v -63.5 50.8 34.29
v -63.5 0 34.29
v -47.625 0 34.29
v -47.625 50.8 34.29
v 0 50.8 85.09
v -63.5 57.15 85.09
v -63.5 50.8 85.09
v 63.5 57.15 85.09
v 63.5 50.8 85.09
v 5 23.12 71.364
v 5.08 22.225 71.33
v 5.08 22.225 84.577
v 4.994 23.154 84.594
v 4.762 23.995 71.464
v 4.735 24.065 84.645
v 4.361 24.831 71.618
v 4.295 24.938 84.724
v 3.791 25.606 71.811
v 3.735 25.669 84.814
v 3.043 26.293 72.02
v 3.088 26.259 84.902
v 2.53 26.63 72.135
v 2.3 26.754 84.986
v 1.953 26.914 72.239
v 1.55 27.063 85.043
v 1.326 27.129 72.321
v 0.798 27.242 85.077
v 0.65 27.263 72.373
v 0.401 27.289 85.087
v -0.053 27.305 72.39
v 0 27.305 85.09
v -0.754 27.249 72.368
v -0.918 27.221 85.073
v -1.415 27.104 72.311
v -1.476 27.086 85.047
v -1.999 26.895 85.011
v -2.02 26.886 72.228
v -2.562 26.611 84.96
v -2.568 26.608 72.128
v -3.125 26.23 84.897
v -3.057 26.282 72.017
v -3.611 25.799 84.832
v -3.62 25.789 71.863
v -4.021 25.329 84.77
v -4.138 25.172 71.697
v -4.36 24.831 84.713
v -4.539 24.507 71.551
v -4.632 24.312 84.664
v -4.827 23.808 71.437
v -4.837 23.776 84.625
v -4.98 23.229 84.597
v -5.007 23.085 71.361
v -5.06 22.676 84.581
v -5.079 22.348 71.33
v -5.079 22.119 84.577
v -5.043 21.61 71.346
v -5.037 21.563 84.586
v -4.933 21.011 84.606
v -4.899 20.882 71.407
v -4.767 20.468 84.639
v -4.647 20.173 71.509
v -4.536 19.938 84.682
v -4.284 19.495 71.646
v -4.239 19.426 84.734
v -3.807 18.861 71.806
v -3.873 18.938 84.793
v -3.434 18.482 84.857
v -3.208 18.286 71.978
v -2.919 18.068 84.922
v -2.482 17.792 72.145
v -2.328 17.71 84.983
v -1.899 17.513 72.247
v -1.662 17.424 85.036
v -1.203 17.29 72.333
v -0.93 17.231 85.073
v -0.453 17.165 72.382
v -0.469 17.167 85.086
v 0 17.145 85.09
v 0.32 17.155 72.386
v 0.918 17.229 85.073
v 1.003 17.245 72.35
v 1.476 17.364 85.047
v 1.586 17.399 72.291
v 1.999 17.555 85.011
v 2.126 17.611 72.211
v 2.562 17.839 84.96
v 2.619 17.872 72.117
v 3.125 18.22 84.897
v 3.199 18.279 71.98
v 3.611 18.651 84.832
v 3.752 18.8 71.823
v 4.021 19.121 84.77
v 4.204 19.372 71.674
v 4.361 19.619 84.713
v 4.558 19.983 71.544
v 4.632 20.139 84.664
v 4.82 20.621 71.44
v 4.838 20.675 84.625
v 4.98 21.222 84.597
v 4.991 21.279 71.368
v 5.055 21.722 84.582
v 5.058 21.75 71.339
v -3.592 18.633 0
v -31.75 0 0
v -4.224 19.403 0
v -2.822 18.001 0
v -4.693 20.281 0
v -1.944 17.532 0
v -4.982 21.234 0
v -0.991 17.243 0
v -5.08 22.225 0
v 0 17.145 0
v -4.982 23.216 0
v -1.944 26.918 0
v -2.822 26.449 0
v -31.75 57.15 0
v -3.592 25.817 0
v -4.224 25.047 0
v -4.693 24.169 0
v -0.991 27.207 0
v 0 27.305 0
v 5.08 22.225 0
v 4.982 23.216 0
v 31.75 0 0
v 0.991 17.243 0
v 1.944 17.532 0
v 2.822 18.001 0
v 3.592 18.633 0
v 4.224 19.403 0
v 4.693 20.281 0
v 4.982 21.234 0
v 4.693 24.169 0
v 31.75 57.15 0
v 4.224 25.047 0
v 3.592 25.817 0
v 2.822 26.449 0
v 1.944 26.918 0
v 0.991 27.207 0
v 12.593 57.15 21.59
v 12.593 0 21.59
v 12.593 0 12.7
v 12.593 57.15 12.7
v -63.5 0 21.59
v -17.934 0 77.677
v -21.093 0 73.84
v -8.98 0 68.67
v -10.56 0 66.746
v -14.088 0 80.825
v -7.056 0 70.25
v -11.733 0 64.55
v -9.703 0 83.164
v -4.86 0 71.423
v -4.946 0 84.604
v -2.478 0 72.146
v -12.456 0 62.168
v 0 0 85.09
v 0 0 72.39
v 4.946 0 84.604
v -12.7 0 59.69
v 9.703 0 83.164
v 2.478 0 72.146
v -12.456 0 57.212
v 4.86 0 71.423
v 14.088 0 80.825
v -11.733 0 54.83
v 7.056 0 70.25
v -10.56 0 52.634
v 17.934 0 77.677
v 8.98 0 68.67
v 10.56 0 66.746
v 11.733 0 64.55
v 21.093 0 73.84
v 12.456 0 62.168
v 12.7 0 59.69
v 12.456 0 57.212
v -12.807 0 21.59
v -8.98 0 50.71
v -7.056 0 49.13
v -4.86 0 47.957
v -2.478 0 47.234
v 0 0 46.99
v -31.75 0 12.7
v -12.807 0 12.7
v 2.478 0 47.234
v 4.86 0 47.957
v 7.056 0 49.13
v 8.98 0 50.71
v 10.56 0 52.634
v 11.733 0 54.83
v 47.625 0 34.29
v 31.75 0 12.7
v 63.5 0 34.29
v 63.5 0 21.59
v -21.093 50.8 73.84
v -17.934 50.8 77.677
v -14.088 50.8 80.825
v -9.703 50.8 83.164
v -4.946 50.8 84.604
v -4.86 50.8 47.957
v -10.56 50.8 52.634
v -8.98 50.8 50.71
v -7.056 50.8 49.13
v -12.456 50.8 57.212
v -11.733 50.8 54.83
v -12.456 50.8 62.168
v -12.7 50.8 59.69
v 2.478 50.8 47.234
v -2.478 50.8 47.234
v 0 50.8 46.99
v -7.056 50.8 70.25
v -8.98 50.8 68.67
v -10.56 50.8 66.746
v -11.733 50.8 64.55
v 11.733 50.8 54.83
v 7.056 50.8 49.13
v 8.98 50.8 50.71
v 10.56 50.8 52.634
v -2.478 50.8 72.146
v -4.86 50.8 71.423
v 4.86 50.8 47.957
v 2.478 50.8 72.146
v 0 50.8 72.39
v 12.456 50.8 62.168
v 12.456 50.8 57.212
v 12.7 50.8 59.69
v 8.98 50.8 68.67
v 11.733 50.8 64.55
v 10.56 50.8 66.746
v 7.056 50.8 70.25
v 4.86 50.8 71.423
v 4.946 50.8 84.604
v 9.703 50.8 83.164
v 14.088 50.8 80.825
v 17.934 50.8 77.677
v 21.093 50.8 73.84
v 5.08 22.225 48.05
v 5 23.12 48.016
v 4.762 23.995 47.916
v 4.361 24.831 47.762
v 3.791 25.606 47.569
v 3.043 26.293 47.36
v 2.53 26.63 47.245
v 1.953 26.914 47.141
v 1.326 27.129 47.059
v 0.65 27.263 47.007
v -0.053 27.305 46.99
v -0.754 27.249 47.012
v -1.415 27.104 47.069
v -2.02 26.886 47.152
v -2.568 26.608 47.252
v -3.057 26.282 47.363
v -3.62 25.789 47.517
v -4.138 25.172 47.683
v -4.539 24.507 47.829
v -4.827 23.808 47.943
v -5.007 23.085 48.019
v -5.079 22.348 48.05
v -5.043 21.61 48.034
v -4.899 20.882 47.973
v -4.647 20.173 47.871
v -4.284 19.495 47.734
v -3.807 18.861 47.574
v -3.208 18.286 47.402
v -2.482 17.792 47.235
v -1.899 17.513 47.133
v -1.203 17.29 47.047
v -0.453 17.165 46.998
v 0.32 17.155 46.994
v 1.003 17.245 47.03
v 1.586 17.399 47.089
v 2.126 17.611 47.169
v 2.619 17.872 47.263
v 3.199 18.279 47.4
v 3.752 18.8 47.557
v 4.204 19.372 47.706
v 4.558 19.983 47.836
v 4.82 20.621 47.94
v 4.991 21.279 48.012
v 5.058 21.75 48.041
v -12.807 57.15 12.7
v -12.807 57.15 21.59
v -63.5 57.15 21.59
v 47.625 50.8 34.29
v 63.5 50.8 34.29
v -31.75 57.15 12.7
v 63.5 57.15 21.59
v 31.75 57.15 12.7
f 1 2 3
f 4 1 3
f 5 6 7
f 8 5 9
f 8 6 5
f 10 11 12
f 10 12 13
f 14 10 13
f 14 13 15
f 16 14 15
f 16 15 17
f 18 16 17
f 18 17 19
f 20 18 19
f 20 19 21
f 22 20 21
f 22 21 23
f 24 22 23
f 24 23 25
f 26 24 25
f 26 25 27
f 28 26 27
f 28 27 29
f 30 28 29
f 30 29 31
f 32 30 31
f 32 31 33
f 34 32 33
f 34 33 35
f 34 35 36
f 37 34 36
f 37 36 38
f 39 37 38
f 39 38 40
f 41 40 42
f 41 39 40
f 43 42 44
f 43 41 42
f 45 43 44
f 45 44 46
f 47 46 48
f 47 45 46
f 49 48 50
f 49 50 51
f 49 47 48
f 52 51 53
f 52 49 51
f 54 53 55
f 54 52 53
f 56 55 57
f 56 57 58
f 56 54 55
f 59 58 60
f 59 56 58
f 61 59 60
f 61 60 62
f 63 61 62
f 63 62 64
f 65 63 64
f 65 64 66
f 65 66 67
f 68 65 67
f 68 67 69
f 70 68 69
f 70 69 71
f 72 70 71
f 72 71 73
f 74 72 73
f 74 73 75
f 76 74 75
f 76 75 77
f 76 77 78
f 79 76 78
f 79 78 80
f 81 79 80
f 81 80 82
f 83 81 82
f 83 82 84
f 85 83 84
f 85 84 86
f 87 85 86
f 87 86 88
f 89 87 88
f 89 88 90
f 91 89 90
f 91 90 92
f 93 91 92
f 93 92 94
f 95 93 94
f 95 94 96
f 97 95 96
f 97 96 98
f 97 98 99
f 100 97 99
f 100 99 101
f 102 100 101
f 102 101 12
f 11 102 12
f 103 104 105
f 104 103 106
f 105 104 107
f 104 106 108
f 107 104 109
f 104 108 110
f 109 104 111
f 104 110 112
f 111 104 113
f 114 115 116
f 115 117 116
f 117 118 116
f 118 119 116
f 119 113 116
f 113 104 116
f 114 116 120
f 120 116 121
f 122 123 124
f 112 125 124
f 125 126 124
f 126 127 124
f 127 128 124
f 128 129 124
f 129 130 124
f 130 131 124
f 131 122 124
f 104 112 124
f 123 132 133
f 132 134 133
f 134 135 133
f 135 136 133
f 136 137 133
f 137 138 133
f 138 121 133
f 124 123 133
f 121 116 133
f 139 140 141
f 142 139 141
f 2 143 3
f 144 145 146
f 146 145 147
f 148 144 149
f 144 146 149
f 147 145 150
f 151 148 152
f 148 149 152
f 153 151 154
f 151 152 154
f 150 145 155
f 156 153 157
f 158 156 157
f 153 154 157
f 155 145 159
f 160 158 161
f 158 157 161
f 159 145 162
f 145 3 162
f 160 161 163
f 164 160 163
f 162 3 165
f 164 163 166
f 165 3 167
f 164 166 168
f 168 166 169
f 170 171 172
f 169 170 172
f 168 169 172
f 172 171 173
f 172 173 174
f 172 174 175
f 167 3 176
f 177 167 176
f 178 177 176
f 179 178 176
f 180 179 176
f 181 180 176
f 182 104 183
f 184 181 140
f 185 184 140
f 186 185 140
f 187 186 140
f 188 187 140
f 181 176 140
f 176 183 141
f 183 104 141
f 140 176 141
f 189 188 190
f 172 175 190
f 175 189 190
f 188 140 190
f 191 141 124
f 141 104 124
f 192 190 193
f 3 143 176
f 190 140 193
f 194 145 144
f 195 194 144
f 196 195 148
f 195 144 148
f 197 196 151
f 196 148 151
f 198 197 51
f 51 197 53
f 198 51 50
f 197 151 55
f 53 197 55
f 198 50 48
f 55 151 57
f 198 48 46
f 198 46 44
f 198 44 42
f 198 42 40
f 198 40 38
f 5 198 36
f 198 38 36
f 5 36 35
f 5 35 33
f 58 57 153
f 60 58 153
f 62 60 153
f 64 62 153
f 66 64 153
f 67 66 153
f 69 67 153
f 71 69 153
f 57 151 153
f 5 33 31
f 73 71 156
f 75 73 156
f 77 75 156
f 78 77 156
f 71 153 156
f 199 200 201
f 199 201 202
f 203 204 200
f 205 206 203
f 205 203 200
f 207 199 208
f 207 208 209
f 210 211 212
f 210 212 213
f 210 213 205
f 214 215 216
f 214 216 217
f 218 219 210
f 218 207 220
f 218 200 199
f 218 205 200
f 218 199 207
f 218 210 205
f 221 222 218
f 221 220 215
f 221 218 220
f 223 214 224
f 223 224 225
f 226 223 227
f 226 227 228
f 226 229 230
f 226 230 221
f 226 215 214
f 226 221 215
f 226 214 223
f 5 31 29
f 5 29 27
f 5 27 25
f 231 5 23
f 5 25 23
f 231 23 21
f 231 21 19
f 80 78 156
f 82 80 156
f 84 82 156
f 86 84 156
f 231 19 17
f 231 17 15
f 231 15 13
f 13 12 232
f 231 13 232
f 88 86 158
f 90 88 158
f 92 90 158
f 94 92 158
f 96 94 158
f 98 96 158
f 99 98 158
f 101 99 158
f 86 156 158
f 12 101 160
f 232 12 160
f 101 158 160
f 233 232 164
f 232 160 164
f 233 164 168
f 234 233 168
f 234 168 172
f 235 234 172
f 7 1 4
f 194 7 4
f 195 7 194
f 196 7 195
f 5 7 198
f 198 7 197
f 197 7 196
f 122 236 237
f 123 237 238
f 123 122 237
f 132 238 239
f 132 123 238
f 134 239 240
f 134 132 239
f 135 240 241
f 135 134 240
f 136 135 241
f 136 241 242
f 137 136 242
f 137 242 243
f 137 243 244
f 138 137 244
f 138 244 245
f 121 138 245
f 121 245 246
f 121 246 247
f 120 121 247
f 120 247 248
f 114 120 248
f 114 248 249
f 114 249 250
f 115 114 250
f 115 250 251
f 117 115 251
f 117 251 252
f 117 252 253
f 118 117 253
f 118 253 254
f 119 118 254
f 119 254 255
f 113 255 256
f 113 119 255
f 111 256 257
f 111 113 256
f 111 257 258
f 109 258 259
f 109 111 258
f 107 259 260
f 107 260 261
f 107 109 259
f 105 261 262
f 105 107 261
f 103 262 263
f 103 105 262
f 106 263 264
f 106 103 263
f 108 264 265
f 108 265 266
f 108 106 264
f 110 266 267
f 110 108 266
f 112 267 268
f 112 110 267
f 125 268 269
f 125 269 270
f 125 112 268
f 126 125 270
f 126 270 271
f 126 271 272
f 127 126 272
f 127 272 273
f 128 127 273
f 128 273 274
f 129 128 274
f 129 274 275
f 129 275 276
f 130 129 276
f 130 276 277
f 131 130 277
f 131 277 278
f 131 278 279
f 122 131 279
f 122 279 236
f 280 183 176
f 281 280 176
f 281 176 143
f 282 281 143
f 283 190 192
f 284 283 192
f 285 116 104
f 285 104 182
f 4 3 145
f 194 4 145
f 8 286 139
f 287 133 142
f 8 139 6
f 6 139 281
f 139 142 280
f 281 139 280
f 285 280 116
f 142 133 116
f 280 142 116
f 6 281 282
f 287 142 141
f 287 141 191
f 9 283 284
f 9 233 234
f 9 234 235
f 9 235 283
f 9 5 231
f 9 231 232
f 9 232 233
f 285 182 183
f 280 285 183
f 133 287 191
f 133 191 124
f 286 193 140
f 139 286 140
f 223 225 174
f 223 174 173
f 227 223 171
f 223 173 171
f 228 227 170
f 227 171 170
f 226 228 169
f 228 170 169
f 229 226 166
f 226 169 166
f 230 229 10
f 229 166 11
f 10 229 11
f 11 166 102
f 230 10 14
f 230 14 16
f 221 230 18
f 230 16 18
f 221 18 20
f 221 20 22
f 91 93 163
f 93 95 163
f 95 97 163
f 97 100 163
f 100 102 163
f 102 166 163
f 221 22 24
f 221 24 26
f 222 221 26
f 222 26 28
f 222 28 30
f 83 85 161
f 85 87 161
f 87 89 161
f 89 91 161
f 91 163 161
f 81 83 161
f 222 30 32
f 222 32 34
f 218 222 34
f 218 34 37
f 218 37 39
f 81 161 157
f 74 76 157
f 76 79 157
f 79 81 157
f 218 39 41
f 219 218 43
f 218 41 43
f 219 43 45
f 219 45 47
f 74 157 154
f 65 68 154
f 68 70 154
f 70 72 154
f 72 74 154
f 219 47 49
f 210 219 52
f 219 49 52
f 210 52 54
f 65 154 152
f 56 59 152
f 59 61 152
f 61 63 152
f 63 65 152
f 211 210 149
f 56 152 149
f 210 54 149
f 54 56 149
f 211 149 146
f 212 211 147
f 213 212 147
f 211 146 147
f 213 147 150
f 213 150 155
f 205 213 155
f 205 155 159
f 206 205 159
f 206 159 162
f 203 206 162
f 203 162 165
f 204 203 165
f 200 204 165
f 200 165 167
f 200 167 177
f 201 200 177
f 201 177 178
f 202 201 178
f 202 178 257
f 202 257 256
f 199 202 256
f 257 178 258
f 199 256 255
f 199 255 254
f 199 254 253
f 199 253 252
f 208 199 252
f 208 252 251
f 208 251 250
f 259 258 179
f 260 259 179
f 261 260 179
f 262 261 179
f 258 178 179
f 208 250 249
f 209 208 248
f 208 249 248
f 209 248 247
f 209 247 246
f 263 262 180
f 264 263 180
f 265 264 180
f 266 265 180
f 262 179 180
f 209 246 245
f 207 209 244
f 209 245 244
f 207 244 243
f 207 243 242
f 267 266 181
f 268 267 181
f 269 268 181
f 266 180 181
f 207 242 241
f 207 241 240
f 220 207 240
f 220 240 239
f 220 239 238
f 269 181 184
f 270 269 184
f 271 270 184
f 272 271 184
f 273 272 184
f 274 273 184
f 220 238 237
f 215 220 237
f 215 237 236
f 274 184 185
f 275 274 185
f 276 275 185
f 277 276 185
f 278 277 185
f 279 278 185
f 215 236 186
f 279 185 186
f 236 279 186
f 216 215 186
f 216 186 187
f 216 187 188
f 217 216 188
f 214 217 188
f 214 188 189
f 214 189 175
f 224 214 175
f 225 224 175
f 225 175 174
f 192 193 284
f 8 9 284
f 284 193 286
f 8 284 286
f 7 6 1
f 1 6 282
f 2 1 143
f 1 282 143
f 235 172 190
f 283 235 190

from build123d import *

# Parameters (mm, degrees)
F0_W     = 14.8242654502
F0_H     = 44.45
F0_W_2   = 95.25
F0_R     = 5.08
F0_W_3   = 16.9257345498
F1_DEPTH = 85.09
F2_R     = 12.7
F3_DEPTH = 50.8
F4_DEPTH = 50.8
F5_DEPTH = 57.151


with BuildPart() as f1:
    # F0 (on Top) → F1 (new body)
    with BuildSketch(Plane.XY):
        with Locations((-56.0878672749, 22.225)):
            Rectangle(F0_W, F0_H)
        with Locations((-1.0507345498, 22.225)):
            Rectangle(F0_W_2, F0_H)
        with Locations((0, 22.225)):
            Circle(F0_R, mode=Mode.SUBTRACT)
        Polygon((-63.5, 57.15), (-63.5, 44.45), (-48.6757345498, 44.45), (46.5742654502, 44.45), (63.5, 44.45), (63.5, 57.15), align=None)
        with Locations((55.0371327251, 22.225)):
            Rectangle(F0_W_3, F0_H)
    extrude(amount=F1_DEPTH)

    # F2 (on face) → F3 (cut)
    with BuildSketch(Plane.XZ):
        with Locations((0, 59.69)):
            Circle(F2_R)
    extrude(amount=-F3_DEPTH, mode=Mode.SUBTRACT)

    # F2 (on face) → F4 (cut)
    with BuildSketch(Plane.XZ):
        with BuildLine():
            Line((-63.5, 85.09), (-63.5, 34.29))
            Line((-63.5, 34.29), (-47.625, 34.29))
            Line((-47.625, 34.29), (-21.0934256055, 73.8401730104))
            ThreePointArc((-21.0934256055, 73.8401730104), (-11.9529410666, 82.1017647645), (2.49e-07, 85.09))
            Line((2.49e-07, 85.09), (-63.5, 85.09))
        make_face()
        with BuildLine():
            Line((47.625, 34.29), (63.5, 34.29))
            Line((63.5, 34.29), (63.5, 85.09))
            Line((63.5, 85.09), (2.49e-07, 85.09))
            ThreePointArc((2.49e-07, 85.09), (11.9529412863, 82.1017646473), (21.0934256055, 73.8401730104))
            Line((21.0934256055, 73.8401730104), (47.625, 34.29))
        make_face()
    extrude(amount=-F4_DEPTH, mode=Mode.SUBTRACT)

    # F2 (on face) → F5 (cut, through all)
    with BuildSketch(Plane.XZ):
        Polygon((-63.5, 0), (-31.75, 0), (-31.75, 12.7), (-12.8072916996, 12.7), (-12.8072916996, 21.59), (-63.5, 21.59), align=None)
        Polygon((31.75, 12.7), (31.75, 0), (63.5, 0), (63.5, 21.59), (12.5927083004, 21.59), (12.5927083004, 12.7), align=None)
    extrude(amount=-F5_DEPTH, mode=Mode.SUBTRACT)


solid = f1.part
